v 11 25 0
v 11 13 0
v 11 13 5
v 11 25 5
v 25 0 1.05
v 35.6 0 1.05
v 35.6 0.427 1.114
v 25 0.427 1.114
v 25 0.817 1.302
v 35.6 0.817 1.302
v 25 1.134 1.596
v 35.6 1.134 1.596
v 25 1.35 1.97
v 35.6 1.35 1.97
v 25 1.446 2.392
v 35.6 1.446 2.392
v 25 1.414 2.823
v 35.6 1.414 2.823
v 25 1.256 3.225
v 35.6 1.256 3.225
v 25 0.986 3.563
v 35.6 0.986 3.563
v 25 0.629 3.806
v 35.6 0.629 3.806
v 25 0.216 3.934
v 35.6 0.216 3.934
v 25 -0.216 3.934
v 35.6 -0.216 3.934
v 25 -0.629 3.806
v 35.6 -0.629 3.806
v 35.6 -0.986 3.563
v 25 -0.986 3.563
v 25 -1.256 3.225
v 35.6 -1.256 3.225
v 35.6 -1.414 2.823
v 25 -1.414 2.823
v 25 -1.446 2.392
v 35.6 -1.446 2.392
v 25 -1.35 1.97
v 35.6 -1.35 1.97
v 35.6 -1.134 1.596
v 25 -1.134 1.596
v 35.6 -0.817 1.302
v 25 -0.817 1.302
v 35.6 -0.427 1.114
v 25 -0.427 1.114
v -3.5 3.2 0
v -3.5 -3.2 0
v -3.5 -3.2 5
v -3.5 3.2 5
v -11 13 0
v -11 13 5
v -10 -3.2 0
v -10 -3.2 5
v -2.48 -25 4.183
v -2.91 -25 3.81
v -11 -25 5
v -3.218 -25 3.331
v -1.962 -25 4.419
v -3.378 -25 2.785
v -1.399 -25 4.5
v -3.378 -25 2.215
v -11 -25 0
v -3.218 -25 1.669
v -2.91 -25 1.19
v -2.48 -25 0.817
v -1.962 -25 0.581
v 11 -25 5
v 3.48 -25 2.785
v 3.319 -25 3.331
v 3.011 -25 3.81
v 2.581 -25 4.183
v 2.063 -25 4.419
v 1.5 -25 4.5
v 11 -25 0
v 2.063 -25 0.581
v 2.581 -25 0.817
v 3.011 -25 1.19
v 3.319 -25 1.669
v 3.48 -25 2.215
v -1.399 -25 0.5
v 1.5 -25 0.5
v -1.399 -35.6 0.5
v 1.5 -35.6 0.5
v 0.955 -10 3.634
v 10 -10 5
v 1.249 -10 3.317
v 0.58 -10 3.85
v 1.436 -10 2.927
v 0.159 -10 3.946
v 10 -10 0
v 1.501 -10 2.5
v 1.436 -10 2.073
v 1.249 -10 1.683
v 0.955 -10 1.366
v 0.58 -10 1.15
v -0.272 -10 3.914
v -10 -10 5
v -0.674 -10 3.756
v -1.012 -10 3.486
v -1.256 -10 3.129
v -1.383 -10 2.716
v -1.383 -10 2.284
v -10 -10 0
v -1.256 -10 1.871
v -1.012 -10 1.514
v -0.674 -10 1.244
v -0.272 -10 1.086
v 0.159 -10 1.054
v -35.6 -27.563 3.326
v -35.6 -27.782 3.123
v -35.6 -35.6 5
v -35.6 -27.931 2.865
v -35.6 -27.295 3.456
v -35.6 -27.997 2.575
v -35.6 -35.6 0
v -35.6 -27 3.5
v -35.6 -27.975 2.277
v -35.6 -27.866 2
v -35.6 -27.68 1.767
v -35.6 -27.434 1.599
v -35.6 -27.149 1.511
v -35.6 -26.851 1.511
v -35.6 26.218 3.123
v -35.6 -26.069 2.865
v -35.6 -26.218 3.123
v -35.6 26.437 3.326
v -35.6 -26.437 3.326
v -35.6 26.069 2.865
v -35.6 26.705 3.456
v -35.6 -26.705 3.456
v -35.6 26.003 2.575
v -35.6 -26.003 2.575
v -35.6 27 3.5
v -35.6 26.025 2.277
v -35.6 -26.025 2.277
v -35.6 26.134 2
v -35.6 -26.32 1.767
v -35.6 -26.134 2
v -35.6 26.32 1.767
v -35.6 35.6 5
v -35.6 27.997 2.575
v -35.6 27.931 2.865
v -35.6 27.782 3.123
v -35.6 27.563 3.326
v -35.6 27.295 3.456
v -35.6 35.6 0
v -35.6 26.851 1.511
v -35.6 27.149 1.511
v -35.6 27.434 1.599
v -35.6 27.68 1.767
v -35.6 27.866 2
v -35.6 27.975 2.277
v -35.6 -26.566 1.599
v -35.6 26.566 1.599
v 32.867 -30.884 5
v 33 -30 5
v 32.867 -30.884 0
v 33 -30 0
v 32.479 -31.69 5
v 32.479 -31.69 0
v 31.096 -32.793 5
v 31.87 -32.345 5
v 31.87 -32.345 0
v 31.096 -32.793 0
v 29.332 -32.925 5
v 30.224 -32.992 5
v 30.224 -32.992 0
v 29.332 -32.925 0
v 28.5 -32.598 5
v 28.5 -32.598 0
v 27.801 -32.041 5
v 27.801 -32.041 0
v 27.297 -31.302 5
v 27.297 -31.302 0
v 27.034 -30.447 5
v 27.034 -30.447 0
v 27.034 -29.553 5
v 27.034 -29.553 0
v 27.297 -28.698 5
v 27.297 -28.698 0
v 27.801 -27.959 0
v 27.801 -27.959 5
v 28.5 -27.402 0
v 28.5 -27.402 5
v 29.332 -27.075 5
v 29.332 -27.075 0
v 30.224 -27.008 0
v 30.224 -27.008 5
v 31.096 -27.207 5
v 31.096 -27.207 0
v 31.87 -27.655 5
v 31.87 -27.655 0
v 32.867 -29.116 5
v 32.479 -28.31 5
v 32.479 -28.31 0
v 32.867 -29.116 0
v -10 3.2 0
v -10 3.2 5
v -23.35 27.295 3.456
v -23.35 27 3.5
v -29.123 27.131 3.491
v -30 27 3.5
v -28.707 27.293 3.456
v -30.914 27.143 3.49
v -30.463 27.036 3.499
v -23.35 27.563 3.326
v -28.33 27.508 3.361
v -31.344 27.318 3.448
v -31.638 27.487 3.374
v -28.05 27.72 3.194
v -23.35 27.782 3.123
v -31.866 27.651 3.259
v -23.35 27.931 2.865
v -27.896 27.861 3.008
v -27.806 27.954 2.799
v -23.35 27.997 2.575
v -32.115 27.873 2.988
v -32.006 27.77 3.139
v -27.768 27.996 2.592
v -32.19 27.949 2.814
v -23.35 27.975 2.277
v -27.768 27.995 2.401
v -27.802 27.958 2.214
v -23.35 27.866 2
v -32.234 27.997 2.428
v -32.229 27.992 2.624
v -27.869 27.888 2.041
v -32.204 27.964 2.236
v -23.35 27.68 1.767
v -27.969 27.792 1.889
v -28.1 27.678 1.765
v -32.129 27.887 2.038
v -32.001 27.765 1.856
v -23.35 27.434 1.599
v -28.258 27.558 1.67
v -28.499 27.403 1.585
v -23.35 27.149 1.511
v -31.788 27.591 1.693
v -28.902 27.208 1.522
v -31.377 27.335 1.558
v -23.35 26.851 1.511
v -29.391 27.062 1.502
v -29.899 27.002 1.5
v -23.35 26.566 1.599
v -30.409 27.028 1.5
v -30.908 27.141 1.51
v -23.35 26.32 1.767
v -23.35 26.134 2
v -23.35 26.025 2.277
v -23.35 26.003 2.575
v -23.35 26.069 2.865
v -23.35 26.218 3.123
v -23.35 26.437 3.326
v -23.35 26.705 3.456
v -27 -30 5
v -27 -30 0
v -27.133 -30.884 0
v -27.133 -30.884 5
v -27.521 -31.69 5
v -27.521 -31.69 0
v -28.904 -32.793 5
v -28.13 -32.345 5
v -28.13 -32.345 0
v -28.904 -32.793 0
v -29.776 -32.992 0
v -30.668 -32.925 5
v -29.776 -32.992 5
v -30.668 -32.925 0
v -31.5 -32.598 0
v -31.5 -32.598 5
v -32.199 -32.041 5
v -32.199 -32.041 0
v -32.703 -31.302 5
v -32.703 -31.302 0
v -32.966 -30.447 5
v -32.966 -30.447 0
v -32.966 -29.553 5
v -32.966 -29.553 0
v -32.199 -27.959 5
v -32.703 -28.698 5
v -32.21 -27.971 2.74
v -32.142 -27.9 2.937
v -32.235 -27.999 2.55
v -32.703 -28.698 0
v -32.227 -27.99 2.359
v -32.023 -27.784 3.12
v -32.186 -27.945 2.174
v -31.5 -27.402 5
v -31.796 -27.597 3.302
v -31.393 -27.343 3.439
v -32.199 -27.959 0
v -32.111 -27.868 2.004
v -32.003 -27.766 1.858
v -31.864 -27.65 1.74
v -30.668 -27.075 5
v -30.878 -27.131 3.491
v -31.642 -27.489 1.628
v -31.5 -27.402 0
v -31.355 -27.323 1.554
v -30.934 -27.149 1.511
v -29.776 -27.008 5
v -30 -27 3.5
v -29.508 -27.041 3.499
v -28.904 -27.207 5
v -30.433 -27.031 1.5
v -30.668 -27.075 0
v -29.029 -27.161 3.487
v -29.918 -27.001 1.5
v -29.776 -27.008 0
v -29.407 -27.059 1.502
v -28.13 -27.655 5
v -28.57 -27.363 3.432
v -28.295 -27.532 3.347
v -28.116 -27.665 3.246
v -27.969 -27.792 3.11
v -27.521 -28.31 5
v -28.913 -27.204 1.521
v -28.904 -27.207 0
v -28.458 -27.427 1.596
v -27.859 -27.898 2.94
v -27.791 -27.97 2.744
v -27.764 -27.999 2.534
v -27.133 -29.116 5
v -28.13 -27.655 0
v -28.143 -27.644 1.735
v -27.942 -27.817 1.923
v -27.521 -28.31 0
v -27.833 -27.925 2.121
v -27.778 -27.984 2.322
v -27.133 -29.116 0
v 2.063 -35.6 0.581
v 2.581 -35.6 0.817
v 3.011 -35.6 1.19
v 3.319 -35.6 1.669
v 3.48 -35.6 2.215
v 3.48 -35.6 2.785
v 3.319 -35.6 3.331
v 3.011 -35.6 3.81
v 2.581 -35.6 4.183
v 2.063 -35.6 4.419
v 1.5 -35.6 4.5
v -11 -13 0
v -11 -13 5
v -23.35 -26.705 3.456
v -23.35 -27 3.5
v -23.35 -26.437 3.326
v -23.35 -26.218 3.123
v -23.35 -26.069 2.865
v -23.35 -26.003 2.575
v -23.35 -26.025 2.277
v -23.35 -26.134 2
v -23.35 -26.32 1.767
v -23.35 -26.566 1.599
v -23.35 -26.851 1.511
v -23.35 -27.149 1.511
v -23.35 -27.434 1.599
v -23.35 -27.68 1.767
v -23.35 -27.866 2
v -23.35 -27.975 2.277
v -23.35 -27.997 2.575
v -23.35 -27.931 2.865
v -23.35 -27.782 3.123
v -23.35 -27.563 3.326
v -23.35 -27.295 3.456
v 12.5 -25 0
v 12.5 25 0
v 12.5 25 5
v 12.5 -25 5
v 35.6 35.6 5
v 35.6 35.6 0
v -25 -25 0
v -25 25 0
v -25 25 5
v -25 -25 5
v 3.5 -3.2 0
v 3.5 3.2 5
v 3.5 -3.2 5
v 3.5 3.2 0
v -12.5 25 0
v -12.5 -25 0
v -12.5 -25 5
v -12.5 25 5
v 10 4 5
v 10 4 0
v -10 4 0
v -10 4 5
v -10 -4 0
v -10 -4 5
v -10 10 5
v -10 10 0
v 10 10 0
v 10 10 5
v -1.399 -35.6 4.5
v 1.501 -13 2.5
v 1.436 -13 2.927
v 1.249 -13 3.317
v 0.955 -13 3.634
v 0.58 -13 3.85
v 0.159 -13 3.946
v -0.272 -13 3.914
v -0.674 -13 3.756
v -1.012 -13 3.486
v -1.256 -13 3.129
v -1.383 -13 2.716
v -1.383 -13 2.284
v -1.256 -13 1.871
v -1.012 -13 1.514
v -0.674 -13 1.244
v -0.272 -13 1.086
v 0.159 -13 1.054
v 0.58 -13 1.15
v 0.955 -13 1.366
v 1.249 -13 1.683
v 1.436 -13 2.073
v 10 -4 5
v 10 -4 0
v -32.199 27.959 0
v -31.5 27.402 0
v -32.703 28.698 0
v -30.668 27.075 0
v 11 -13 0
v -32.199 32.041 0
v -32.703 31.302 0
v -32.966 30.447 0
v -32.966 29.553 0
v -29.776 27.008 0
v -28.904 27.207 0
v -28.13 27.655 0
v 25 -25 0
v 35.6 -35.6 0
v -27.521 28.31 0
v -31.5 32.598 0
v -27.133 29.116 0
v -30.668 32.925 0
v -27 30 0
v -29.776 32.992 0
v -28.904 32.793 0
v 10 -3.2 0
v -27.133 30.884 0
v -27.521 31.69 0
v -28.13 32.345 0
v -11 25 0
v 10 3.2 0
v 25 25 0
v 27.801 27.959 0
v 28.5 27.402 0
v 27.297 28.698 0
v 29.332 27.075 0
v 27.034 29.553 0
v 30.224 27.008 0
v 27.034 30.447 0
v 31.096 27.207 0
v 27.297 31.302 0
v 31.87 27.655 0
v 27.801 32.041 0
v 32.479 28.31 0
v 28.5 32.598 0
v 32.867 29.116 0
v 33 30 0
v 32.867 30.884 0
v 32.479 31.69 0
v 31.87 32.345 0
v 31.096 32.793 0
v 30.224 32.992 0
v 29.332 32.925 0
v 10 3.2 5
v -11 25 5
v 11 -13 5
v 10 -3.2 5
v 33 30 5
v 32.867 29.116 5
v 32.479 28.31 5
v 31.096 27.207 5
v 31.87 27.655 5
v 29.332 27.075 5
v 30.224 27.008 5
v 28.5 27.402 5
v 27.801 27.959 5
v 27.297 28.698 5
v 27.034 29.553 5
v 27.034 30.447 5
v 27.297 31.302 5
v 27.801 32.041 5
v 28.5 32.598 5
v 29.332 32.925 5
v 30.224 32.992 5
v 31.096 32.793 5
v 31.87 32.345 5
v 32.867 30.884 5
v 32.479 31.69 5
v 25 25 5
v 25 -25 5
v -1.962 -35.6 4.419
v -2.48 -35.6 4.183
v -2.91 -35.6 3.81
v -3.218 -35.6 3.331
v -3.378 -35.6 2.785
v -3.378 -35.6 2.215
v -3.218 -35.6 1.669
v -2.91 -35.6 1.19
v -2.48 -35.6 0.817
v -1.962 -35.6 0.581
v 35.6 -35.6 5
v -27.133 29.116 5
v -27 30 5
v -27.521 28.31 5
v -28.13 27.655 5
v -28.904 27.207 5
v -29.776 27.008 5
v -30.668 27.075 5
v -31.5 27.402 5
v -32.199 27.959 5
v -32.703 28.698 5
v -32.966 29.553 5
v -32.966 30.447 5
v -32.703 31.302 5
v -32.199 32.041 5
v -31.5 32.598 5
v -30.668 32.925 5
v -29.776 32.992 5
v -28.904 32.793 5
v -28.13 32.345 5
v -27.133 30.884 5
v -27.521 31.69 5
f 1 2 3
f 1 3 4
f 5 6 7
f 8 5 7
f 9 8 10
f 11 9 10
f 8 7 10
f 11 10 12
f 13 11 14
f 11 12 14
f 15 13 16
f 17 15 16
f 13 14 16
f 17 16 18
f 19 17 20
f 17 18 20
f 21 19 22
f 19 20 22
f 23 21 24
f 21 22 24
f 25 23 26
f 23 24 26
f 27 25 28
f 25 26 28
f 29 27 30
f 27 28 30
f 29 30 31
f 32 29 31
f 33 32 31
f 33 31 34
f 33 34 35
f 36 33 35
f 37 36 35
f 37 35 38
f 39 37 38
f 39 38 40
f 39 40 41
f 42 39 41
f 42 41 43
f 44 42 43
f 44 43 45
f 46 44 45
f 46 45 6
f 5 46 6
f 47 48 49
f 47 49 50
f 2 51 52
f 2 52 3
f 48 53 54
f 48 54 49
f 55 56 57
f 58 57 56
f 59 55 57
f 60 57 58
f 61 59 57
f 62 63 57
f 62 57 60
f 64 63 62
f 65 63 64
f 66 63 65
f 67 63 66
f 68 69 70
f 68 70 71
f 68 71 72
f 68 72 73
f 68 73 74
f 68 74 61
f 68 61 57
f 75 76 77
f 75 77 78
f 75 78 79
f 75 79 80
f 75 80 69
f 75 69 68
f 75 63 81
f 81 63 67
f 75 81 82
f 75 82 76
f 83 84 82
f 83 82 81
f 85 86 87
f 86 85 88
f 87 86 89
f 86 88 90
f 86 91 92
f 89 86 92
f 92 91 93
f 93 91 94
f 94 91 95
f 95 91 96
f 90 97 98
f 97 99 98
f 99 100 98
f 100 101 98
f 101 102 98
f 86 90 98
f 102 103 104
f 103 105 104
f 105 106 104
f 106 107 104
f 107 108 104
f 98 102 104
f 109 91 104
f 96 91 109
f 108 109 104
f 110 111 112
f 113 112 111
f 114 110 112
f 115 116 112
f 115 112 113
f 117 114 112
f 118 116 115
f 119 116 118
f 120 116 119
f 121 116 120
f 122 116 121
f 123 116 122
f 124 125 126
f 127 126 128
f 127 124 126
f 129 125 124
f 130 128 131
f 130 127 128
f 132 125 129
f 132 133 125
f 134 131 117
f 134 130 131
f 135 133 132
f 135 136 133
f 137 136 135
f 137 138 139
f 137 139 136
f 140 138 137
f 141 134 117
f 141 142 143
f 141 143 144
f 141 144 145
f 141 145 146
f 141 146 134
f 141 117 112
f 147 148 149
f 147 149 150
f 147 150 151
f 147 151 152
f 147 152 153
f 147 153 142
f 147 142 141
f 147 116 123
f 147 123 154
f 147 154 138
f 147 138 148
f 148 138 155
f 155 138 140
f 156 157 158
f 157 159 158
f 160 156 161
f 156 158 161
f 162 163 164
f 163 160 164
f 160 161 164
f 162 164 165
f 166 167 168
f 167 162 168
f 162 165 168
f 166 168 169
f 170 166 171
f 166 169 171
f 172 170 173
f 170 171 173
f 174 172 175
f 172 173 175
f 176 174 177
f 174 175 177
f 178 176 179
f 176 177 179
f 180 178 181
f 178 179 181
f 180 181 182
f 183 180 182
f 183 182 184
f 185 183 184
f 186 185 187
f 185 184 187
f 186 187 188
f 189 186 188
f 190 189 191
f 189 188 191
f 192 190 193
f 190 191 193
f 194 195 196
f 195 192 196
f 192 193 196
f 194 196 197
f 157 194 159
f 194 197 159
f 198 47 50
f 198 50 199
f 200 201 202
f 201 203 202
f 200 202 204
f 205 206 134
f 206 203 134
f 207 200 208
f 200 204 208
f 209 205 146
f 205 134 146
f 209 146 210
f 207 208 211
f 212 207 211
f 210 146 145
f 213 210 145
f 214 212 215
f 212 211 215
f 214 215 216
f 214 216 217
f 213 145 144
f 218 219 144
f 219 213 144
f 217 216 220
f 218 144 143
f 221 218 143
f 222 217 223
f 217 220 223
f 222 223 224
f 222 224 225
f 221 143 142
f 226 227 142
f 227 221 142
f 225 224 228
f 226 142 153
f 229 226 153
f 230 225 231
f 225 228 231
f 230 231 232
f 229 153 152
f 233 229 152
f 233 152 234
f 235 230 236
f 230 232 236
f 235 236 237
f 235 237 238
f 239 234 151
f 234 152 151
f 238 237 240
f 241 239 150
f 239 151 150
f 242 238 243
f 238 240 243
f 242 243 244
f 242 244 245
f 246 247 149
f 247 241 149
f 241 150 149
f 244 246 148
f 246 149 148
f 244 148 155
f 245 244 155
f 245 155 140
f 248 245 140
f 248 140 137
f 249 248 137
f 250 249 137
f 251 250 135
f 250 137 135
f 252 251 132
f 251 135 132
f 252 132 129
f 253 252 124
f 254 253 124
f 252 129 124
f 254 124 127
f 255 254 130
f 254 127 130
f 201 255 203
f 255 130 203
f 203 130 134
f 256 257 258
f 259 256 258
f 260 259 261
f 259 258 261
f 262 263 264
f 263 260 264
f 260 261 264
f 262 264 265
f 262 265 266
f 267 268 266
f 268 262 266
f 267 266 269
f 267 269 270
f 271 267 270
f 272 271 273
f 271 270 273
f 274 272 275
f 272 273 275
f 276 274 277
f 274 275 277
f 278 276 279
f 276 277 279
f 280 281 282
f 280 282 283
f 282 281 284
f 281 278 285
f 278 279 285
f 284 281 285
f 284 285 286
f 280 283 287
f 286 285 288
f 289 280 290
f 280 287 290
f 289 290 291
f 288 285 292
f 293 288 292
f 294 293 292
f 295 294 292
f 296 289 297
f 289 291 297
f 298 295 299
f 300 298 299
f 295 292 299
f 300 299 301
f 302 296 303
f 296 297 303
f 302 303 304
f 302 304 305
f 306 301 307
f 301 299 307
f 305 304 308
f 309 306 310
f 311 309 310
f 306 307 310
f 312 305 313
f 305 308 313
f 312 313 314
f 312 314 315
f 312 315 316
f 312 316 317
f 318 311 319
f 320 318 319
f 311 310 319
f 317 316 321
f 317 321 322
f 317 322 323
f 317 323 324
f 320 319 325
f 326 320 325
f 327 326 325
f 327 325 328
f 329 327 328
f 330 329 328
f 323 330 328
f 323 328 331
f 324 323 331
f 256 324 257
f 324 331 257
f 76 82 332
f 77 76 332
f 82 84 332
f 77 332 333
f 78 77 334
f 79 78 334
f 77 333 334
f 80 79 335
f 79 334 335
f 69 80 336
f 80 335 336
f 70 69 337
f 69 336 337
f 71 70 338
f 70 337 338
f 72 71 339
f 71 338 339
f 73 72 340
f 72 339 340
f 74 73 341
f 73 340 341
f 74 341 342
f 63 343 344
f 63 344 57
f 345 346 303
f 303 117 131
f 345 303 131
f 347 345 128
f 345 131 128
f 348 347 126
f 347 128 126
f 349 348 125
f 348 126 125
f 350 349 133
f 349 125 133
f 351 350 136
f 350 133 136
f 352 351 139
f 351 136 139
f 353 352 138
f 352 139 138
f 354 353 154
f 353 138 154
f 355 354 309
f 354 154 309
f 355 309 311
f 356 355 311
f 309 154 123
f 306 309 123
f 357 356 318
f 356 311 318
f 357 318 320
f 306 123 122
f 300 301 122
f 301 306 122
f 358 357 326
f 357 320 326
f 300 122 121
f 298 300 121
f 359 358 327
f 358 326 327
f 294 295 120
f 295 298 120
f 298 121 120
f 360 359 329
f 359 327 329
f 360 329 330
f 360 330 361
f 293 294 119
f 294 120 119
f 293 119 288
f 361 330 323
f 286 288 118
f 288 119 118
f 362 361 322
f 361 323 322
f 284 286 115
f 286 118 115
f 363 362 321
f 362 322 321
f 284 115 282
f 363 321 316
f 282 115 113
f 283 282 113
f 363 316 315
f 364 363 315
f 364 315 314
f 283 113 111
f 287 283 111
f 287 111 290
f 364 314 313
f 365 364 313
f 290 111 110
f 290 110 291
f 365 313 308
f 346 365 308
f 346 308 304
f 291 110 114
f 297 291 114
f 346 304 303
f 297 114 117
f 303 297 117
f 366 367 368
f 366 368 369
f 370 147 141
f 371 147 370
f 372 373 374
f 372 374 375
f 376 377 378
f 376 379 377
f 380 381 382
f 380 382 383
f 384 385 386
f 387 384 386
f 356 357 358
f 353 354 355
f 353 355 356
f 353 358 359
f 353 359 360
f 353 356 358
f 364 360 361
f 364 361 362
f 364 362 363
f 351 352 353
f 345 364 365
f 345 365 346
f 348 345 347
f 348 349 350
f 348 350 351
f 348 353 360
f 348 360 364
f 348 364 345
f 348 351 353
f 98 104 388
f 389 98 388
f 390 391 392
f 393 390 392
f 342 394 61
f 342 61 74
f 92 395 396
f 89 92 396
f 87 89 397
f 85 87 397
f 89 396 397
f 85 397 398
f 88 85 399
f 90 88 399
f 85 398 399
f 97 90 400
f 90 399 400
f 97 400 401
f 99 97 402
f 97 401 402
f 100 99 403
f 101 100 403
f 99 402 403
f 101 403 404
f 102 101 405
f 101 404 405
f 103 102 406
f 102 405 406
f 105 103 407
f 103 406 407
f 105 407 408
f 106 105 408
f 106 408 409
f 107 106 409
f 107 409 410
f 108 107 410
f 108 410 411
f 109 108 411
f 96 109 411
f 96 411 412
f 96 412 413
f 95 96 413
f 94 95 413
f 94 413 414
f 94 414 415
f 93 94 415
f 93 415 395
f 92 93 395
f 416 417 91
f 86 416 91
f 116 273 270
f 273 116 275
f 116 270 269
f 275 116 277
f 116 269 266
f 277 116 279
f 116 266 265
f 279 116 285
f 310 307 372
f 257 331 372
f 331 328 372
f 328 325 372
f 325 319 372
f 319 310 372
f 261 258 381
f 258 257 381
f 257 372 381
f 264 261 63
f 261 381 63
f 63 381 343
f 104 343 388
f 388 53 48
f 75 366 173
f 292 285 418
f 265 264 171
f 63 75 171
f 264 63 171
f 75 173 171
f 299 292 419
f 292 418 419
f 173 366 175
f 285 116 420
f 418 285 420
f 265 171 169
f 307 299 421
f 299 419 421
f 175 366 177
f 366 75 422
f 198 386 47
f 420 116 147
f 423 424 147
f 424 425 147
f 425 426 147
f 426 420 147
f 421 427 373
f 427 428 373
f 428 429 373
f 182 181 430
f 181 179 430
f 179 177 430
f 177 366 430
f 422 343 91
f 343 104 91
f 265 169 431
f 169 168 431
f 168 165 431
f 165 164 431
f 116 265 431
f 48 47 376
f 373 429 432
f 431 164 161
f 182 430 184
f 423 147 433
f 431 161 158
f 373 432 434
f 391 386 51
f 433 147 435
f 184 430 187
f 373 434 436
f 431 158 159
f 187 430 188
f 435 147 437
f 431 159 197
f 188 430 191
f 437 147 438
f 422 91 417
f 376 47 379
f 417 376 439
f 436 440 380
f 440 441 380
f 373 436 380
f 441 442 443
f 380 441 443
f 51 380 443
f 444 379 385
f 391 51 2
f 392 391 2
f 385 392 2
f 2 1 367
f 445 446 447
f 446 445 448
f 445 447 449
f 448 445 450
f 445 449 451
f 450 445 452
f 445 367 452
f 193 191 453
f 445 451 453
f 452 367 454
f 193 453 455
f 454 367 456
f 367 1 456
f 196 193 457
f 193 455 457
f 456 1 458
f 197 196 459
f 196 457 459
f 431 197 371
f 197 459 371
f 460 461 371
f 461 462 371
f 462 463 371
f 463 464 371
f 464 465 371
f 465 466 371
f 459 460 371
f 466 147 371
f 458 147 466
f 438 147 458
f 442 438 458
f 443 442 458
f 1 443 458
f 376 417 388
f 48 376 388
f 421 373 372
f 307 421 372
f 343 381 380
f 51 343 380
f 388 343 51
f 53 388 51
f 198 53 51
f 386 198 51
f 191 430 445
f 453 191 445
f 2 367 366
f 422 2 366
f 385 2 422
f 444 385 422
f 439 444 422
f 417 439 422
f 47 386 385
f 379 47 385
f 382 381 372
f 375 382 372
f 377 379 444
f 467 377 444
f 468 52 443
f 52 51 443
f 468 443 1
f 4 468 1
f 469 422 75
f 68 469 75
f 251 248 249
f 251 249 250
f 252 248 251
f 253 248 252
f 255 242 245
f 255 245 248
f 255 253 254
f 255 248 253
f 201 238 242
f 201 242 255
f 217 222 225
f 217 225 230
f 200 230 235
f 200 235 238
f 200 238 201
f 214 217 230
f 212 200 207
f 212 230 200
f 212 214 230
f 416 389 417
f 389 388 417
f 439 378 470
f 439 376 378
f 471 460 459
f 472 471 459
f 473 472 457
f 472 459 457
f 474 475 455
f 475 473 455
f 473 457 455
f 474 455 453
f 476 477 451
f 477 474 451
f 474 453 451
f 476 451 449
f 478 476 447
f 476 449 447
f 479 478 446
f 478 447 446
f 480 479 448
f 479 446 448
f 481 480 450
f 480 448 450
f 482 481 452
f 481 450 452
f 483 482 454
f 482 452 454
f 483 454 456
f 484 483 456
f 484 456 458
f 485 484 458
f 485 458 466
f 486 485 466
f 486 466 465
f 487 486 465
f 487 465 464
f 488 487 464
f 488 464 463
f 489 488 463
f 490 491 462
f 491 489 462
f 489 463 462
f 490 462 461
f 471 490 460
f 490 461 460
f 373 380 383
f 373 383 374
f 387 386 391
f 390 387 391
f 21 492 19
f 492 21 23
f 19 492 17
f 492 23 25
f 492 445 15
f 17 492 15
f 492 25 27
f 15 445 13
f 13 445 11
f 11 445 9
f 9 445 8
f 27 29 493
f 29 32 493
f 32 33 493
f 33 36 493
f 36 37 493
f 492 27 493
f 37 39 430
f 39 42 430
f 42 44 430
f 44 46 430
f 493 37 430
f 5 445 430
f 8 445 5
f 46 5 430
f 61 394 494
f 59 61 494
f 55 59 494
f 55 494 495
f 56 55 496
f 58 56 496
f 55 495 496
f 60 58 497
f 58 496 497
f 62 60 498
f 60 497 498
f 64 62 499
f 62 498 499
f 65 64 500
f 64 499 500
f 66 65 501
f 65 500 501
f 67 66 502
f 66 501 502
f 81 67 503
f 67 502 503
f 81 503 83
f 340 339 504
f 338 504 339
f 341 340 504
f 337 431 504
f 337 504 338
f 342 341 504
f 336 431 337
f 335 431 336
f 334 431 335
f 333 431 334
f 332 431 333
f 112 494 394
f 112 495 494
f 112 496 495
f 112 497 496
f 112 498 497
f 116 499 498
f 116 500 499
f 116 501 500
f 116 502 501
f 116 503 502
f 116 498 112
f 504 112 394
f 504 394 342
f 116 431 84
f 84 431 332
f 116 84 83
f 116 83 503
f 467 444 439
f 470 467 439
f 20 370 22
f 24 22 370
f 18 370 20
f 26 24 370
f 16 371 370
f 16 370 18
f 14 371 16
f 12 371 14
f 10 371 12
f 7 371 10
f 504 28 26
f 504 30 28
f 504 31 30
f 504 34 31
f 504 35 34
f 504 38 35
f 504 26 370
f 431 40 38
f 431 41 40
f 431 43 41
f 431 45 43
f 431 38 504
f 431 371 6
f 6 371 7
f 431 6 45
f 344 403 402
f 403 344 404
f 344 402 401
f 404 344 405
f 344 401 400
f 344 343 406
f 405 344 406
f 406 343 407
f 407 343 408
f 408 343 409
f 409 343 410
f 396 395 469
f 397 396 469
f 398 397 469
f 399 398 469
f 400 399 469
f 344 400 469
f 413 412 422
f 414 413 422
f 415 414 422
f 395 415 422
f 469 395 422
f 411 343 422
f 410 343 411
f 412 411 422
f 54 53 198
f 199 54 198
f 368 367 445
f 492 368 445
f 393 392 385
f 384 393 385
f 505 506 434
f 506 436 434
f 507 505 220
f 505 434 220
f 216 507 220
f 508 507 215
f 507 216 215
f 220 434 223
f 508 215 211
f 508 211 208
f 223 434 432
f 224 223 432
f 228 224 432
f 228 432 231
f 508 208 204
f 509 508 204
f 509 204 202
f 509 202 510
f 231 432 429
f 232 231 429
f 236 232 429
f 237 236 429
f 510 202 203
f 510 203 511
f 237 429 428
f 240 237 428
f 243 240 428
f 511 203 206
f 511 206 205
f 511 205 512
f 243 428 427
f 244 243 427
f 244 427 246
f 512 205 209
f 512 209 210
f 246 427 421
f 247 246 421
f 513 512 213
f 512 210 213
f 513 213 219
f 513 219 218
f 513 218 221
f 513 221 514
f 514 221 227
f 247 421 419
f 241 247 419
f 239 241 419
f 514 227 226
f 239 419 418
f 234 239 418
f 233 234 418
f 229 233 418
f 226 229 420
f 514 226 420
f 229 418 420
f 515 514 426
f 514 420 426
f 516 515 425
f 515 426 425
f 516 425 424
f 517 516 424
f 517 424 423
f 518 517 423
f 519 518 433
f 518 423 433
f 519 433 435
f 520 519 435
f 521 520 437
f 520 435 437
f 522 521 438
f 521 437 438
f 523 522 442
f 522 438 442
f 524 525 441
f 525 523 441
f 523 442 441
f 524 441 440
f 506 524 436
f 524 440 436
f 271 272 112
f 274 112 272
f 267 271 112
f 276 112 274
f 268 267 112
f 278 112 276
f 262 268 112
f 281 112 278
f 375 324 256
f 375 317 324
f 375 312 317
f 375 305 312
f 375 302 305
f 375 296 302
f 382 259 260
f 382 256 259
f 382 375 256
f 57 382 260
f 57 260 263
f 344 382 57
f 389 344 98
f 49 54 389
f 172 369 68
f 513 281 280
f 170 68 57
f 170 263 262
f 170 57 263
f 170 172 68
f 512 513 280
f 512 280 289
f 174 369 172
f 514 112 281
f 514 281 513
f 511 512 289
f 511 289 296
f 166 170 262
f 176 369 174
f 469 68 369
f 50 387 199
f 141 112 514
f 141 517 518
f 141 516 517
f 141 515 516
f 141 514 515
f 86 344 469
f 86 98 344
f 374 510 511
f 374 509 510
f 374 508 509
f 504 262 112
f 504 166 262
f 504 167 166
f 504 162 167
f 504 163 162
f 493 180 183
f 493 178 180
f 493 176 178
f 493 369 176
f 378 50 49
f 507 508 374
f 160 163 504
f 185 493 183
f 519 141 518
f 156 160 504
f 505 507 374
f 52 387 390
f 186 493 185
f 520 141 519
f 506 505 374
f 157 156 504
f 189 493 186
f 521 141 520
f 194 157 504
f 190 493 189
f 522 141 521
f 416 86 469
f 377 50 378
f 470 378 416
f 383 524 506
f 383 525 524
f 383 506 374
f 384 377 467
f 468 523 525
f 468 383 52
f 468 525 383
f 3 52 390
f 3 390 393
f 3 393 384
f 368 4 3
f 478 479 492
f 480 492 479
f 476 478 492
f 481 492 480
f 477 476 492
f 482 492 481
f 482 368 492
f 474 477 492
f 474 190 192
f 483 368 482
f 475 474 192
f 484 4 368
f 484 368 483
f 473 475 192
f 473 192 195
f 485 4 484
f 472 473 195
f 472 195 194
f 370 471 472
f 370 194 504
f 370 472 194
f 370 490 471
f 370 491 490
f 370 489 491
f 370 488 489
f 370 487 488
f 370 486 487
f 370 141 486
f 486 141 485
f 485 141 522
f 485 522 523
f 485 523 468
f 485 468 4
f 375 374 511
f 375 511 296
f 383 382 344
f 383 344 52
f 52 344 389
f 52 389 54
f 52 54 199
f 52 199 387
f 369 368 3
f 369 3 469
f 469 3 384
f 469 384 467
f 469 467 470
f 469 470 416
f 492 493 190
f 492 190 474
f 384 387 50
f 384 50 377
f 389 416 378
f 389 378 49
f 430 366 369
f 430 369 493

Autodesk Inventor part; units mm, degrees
ref_plane "YZ Plane" through (0, 0, 0) normal (1, 0, 0) x (0, 1, 0)
ref_plane "XZ Plane" through (0, 0, 0) normal (0, 1, 0) x (-1, 0, 0)
ref_plane "XY Plane" through (0, 0, 0) normal (0, 0, 1) x (1, 0, 0)
sketch "Szkic1" plane through (0, 0, 0) normal (0, 0, 1) x (1, 0, 0)
  line L0 (-35.6, 35.6) -> (35.6, 35.6)
  line L1 (35.6, 35.6) -> (35.6, -35.6)
  line L2 (35.6, -35.6) -> (-35.6, -35.6)
  line L3 (-35.6, -35.6) -> (-35.6, 35.6)
  line L4 (-35.6, -35.6) -> (35.6, 35.6) construction
  line L5 (-35.6, 35.6) -> (35.6, -35.6) construction
  line L6 (-30, 30) -> (30, 30) construction
  line L7 (30, 30) -> (30, -30) construction
  line L8 (30, -30) -> (-30, -30) construction
  line L9 (-30, -30) -> (-30, 30) construction
  circle A0 centre (30, 30) radius 3
  circle A1 centre (30, -30) radius 3
  circle A2 centre (-30, -30) radius 3
  circle A3 centre (-30, 30) radius 3
  circle A4 centre (0, 0) radius 28 construction
  line L10 (-11, 13) -> (11, 13)
  line L11 (-10, 10) -> (10, 10)
  line L12 (10, -10) -> (-10, -10)
  line L13 (-4, 4) -> (4, 4)
  line L14 (3.5, 3.2) -> (3.5, -3.2)
  line L15 (4, -4) -> (-3.8927, -4)
  line L16 (-3.5, -3.2) -> (-3.5, 3.2)
  line L17 (4, 4) -> (10, 4)
  line L18 (-4, 4) -> (-10, 4)
  line L19 (-3.8927, -4) -> (-10, -4)
  line L20 (4, -4) -> (10, -4)
  line L21 (-3.5, 3.2) -> (-10, 3.2)
  line L22 (3.5, 3.2) -> (10, 3.2)
  line L23 (-10, -3.2) -> (-3.5, -3.2)
  line L24 (3.5, -3.2) -> (10, -3.2)
  line L25 (10, 10) -> (10, 4)
  line L26 (-10, 4) -> (-10, 10)
  line L27 (-10, -10) -> (-10, -4)
  line L28 (-10, -3.2) -> (-10, 3.2)
  line L29 (10, 3.2) -> (10, -3.2)
  line L30 (10, -4) -> (10, -10)
  line L31 (-12.5, 12.5) -> (-12.5, 25)
  line L32 (12.5, 12.5) -> (12.5, 25)
  line L33 (11, 13) -> (11, 25)
  line L34 (-11, 13) -> (-11, 25)
  line L35 (-11, 25) -> (11, 25)
  line L36 (-12.5, 25) -> (-25, 25)
  line L37 (-25, 25) -> (-25, 0)
  line L38 (12.5, 25) -> (25, 25)
  line L39 (25, 0) -> (25, 25)
  line L40 (-12.5, 12.5) -> (-12.5, 0)
  line L41 (12.5, 12.5) -> (12.5, 0)
  line L42 (-35.6, 0) -> (35.6, 0) construction
  line L43 (-11, -13) -> (11, -13)
  line L44 (-12.5, -12.5) -> (-12.5, -25)
  line L45 (12.5, -12.5) -> (12.5, -25)
  line L46 (11, -13) -> (11, -25)
  line L47 (-11, -13) -> (-11, -25)
  line L48 (-11, -25) -> (11, -25)
  line L49 (-12.5, -25) -> (-25, -25)
  line L50 (-25, -25) -> (-25, 0)
  line L51 (12.5, -25) -> (25, -25)
  line L52 (25, 0) -> (25, -25)
  line L53 (-12.5, -12.5) -> (-12.5, 0)
  line L54 (12.5, -12.5) -> (12.5, 0)
  point P0 (0, 0)
  point P1 (0, 0)
  dimension "d0" = 60
  dimension "d1" = 35.6
  dimension "d2" = 6
  dimension "d3" = 56
  dimension "d4" = 25
  dimension "d5" = 0.8
  dimension "d6" = 0.8
  dimension "d7" = 20
  dimension "d8" = 7
  dimension "d9" = 6
  dimension "d11" = 1.5
  dimension "d12" = 1.5
  dimension "d13" = 25
  dimension "d14" = 12.5
  dimension "d15" = 12.5
  dimension "d16" = 3
extrude "Wyciągnięcie proste1" add sketch "Szkic1" along normal blind 5
sketch "Szkic4" plane through (-35.6, -35.6, 0) normal (0, -1, 0) x (1, 0, 0)
  circle A0 centre (35.6506, 2.5) radius 1.45
  circle A1 centre (35.6506, 2.5) radius 2
  line L0 (0, 0) -> (0, 5) construction
  line L1 (0, 2.5) -> (71.3012, 2.5) construction
  line L2 (39.1, 0) -> (39.1, 5) projected
  line L3 (34.2012, 4.5) -> (37.1, 4.5)
  line L4 (39.1, 2.5) -> (39.1, 2.5)
  line L5 (37.1, 0.5) -> (34.2012, 0.5)
  line L6 (32.2012, 2.5) -> (32.2012, 2.5)
  line L7 (32.2012, 4.5) -> (39.1, 0.5) construction
  line L8 (39.1, 4.5) -> (32.2012, 0.5) construction
  arc A2 (39.1, 2.5) -> (37.1, 4.5) centre (37.1, 2.5) ccw
  arc A3 (37.1, 0.5) -> (39.1, 2.5) centre (37.1, 2.5) ccw
  arc A4 (32.2012, 2.5) -> (34.2012, 0.5) centre (34.2012, 2.5) ccw
  arc A5 (34.2012, 4.5) -> (32.2012, 2.5) centre (34.2012, 2.5) ccw
  point P0 (35.6, 0)
  dimension "d19" = 2.9
  dimension "d20" = 4
  dimension "d23" = 2
extrude "Wyciągnięcie proste2" cut sketch "Szkic4" against normal blind 26.5 contours A0
extrude "Wyciągnięcie proste3" cut sketch "Szkic4" against normal blind 13 contours A0 | A1 | A1 L3 A2 A3 L5 | A1 L5 A4 A5 L3
sketch "Szkic6" plane through (35.6, -35.6, 0) normal (1, 0, 0) x (0, 0, -1)
  line L0 (0, 71.2) -> (-5, 71.2) construction
  line L1 (-2.5, 71.2) -> (-2.5, 0) construction
  line L2 (0, 0) -> (-5, 0) construction
  circle A0 centre (-2.5, 35.6) radius 1.45
  point P0 (0, 35.6)
  dimension "d26" = 2.9
extrude "Wyciągnięcie proste4" cut sketch "Szkic6" against normal blind 17
sketch "Szkic7" plane through (-35.6, -35.6, 0) normal (-1, 0, 0) x (0, 0, 1)
  line L0 (5, 62.6) -> (0, 62.6) projected
  circle A0 centre (2.5, 62.6) radius 1
  line L1 (5, 8.6) -> (0, 8.6) projected
  circle A1 centre (2.5, 8.6) radius 1
  point P0 (0, 35.6)
  dimension "d29" = 2
  dimension "d32" = 2
extrude "Wyciągnięcie proste5" cut sketch "Szkic7" against normal blind 12.25
properties part number "led_holder"
